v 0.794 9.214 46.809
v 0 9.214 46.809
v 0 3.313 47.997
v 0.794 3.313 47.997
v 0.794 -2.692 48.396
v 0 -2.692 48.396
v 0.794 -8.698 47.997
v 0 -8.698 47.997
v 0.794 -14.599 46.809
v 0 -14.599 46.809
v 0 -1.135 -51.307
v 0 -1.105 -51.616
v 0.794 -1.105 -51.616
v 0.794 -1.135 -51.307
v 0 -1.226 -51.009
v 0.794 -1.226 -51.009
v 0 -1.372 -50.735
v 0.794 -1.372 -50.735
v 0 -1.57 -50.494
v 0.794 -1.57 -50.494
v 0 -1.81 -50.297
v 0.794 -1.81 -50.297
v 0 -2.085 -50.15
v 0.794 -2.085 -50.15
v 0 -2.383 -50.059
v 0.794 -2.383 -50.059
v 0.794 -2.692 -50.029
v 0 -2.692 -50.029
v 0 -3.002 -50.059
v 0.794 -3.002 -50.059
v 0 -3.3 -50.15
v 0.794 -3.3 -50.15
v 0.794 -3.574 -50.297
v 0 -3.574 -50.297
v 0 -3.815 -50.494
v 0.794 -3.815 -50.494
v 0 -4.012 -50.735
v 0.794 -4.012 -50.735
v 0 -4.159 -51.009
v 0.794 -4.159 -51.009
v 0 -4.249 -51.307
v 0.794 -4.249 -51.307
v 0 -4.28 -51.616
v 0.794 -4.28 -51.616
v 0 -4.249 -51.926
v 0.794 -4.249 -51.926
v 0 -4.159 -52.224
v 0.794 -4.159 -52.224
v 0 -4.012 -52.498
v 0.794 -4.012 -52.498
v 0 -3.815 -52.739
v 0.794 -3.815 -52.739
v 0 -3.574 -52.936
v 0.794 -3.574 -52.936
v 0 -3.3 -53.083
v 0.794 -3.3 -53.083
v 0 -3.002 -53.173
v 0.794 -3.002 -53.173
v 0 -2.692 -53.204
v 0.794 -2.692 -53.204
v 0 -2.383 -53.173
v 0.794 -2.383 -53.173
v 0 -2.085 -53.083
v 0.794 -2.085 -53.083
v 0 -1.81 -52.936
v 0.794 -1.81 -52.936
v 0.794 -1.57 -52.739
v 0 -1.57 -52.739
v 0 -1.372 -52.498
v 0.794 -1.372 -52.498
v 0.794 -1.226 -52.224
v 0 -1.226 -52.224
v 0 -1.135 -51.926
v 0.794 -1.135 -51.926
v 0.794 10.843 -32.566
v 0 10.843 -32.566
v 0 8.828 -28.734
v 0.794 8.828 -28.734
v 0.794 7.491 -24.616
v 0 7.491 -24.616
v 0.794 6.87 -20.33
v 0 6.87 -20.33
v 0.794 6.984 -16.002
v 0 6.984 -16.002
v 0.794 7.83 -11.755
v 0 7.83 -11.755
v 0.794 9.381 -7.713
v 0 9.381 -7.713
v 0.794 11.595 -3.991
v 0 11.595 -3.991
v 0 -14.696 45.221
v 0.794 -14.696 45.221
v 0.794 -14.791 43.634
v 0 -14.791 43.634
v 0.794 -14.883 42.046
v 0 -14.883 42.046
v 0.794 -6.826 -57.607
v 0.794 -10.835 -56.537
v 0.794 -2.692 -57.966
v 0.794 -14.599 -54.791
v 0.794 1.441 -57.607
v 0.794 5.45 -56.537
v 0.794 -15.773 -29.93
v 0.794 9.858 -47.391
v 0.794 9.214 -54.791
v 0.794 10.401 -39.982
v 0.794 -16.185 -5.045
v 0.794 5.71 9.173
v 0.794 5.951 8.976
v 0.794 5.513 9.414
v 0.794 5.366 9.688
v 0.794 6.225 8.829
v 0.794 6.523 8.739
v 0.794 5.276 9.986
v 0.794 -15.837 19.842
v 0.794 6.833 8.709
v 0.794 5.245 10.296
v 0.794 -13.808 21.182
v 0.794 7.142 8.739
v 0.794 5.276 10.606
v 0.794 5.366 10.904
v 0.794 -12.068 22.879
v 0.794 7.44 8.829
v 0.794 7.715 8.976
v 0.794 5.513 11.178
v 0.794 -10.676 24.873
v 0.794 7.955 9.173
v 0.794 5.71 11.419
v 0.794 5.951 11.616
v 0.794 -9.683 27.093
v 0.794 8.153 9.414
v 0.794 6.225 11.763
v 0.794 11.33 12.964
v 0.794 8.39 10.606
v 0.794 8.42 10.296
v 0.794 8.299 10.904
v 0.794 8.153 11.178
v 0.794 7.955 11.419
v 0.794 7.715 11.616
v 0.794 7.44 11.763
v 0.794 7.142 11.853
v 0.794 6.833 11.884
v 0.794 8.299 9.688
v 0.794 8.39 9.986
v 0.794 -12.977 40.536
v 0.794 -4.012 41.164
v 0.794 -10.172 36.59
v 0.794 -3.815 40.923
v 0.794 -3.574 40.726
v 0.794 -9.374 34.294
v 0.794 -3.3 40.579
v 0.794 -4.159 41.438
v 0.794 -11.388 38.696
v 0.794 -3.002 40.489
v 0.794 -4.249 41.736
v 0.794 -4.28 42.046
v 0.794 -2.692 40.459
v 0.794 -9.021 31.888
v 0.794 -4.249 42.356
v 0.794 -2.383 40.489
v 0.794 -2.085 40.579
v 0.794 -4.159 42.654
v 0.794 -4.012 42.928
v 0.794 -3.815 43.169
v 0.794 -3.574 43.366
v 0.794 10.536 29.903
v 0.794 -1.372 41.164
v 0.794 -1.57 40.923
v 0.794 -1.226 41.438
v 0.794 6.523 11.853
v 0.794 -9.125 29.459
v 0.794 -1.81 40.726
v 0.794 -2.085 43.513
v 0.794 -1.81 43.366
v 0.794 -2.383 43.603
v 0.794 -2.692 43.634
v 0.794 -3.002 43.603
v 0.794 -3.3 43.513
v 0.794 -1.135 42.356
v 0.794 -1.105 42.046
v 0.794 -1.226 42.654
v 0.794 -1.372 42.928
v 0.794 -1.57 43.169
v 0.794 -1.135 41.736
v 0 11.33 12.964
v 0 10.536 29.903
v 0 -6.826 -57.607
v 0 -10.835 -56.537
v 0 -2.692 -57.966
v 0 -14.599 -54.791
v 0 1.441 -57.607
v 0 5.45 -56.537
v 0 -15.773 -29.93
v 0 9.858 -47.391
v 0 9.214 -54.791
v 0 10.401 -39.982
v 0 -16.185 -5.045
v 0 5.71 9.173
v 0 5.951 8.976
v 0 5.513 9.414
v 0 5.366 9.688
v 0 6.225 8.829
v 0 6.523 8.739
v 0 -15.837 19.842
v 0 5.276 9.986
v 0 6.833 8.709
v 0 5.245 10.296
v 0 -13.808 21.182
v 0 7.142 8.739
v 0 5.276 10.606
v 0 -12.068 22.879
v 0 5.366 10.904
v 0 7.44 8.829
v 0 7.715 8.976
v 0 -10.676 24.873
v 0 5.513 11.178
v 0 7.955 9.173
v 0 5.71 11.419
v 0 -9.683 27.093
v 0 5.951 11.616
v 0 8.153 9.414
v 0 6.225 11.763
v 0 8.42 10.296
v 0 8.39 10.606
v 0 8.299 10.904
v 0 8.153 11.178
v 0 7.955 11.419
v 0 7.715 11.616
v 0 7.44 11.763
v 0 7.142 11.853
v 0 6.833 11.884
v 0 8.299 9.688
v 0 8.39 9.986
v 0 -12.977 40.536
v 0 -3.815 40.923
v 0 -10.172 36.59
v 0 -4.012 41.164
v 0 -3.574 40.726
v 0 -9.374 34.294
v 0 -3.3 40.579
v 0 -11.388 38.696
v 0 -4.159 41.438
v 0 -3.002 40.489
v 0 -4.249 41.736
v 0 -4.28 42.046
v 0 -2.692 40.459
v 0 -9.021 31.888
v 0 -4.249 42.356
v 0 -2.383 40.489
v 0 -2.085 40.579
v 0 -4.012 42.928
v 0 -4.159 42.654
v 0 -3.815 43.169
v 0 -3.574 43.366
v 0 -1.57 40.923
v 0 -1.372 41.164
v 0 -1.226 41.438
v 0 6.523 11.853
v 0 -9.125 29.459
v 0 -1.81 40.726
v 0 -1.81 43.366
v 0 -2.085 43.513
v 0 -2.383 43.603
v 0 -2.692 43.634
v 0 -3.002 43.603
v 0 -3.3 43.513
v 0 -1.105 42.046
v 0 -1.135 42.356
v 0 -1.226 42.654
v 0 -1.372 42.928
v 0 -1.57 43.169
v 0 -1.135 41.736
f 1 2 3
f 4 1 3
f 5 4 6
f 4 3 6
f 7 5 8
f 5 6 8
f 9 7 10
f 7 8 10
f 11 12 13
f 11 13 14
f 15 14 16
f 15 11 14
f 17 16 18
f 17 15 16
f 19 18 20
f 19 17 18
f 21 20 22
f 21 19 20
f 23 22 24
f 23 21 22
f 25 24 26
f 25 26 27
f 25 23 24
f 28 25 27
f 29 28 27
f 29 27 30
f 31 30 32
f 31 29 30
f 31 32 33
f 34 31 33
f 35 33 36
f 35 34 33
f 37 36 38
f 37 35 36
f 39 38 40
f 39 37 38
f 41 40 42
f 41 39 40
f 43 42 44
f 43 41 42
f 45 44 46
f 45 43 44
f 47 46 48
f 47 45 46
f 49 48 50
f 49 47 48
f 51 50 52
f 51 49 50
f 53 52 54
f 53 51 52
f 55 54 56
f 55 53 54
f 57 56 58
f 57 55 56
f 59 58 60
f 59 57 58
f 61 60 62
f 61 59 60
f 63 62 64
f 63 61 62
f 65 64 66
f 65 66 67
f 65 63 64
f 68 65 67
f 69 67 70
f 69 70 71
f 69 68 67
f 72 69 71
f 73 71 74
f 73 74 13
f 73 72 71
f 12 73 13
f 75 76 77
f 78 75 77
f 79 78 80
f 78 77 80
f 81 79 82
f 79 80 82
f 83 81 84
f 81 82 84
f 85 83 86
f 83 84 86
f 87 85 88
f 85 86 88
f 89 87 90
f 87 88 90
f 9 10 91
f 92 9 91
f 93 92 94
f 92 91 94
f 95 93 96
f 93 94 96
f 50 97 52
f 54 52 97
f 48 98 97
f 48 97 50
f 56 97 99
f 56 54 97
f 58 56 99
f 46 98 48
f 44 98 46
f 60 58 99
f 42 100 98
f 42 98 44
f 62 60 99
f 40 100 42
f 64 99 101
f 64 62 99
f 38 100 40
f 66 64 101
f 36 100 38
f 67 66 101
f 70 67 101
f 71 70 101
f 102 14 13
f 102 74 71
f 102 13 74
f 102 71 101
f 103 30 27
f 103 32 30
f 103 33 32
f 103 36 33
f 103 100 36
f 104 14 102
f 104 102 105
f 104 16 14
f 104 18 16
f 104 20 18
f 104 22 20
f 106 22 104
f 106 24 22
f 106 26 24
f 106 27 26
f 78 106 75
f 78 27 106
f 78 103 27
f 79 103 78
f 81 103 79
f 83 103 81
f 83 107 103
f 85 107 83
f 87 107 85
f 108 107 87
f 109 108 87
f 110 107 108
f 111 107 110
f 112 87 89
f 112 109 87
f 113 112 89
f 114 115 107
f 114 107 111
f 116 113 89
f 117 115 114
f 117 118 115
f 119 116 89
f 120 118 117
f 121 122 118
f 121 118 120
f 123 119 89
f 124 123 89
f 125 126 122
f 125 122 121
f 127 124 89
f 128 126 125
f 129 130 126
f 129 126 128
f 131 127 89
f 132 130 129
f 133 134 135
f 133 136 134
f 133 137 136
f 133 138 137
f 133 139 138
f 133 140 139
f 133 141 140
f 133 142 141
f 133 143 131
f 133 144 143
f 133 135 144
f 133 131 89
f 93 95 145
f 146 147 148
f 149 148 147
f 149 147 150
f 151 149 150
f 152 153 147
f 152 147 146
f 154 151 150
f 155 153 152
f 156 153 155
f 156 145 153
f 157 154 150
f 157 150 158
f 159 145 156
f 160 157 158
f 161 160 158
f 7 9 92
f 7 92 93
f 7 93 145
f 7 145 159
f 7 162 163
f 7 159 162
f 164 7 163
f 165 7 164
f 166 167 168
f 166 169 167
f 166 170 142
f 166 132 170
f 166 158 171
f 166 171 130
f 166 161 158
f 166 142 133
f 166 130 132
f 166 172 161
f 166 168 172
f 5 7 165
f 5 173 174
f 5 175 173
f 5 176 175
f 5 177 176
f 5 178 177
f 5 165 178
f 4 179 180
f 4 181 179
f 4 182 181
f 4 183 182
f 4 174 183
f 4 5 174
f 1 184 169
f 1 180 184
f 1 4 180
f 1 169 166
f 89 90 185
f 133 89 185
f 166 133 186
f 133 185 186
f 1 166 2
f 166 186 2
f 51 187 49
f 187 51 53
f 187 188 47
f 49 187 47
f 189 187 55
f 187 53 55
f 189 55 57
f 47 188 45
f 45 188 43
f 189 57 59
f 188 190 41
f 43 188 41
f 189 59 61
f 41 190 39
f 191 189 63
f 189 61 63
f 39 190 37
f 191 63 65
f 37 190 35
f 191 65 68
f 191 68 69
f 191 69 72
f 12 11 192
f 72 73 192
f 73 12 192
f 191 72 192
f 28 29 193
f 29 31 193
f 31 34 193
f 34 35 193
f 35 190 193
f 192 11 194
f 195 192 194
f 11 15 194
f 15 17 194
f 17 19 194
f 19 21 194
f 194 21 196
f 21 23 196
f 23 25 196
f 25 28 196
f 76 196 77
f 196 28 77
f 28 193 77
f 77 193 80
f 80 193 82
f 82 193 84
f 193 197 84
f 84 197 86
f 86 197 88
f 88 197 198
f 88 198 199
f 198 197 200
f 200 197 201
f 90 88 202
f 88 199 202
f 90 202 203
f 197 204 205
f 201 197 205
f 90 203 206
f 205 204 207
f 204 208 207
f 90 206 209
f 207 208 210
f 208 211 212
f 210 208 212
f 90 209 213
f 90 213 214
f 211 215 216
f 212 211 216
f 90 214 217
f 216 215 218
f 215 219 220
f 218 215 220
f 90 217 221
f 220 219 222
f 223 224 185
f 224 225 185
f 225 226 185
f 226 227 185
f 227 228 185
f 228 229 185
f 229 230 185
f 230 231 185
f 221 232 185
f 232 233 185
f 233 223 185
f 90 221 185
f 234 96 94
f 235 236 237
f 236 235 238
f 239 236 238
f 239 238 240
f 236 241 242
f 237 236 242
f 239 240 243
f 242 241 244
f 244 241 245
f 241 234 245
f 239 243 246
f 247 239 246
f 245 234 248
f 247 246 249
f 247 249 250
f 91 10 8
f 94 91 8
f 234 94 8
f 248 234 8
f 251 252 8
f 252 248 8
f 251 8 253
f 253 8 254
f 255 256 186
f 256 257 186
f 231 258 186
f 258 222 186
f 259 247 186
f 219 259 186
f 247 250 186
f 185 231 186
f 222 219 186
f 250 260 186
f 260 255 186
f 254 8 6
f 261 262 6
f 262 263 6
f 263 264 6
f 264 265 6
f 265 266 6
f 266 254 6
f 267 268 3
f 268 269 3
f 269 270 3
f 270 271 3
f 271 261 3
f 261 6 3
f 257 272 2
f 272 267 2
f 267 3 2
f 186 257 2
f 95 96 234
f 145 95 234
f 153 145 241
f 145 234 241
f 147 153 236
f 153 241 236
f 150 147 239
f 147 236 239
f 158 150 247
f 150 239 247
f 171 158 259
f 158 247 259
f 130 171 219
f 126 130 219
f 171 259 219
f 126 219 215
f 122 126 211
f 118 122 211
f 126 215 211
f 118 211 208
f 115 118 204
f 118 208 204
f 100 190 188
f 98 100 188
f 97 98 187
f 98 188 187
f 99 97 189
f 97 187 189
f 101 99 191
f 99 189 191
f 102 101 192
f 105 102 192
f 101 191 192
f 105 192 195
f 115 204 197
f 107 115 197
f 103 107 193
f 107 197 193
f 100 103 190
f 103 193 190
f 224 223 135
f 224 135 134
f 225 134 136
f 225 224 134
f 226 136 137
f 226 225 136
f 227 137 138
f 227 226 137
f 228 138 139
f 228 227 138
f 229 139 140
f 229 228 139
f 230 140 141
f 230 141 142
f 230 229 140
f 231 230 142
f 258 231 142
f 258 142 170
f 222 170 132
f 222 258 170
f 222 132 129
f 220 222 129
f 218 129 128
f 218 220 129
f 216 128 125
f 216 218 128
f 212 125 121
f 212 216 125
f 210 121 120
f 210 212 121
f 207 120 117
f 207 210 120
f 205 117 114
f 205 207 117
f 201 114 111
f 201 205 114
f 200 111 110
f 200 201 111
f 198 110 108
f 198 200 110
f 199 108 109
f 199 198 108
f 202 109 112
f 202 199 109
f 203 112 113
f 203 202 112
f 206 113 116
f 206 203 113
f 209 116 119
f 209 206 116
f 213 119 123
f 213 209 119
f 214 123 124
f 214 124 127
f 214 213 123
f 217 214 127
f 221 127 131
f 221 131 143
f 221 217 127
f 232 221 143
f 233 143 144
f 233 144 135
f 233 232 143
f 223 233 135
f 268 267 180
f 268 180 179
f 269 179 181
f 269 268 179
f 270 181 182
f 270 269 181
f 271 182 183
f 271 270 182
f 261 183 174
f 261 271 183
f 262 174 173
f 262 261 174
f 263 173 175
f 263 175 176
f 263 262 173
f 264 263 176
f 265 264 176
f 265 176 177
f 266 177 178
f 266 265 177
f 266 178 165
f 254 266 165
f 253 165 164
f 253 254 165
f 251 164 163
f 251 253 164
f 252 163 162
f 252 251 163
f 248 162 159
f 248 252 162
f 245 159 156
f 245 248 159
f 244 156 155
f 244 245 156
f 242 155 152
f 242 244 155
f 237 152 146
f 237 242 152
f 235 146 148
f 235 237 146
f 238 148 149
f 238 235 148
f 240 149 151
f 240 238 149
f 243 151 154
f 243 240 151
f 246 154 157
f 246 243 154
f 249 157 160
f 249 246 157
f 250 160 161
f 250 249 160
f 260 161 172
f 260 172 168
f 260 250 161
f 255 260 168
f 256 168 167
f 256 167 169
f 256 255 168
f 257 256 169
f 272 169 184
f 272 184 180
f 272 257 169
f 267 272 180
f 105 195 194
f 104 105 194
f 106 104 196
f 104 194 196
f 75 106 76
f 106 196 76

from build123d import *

# Parameters (mm, degrees)
F0_R     = 1.5875
F1_DEPTH = 0.79375


with BuildPart() as f1:
    # F0 (on Right) → F1 (new body)
    with BuildSketch(Plane.YZ):
        with BuildLine():
            ThreePointArc((-14.598681, -54.791494), (-2.692431, -57.966494), (9.213819, -54.791494))
            ThreePointArc((9.213819, -54.791494), (10.142302, -43.68735), (10.842757, -32.566494))
            ThreePointArc((10.842757, -32.566494), (6.835346, -18.163585), (11.595069, -3.991494))
            ThreePointArc((11.595069, -3.991494), (10.99943, 21.436396), (9.213819, 46.808506))
            ThreePointArc((9.213819, 46.808506), (-2.692431, 48.396006), (-14.598681, 46.808506))
            ThreePointArc((-14.598681, 46.808506), (-14.744138, 44.427464), (-14.882613, 42.046006))
            ThreePointArc((-14.882613, 42.046006), (-9.015448, 30.671057), (-15.83703, 19.841509))
            ThreePointArc((-15.83703, 19.841509), (-16.074209, -17.489202), (-14.598681, -54.791494))
        make_face()
        with Locations((-2.692431, -51.616494)):
            Circle(F0_R, mode=Mode.SUBTRACT)
        with Locations((-2.692431, 42.046006)):
            Circle(F0_R, mode=Mode.SUBTRACT)
        with Locations((6.832569, 10.296006)):
            Circle(F0_R, mode=Mode.SUBTRACT)
    extrude(amount=F1_DEPTH)


solid = f1.part
